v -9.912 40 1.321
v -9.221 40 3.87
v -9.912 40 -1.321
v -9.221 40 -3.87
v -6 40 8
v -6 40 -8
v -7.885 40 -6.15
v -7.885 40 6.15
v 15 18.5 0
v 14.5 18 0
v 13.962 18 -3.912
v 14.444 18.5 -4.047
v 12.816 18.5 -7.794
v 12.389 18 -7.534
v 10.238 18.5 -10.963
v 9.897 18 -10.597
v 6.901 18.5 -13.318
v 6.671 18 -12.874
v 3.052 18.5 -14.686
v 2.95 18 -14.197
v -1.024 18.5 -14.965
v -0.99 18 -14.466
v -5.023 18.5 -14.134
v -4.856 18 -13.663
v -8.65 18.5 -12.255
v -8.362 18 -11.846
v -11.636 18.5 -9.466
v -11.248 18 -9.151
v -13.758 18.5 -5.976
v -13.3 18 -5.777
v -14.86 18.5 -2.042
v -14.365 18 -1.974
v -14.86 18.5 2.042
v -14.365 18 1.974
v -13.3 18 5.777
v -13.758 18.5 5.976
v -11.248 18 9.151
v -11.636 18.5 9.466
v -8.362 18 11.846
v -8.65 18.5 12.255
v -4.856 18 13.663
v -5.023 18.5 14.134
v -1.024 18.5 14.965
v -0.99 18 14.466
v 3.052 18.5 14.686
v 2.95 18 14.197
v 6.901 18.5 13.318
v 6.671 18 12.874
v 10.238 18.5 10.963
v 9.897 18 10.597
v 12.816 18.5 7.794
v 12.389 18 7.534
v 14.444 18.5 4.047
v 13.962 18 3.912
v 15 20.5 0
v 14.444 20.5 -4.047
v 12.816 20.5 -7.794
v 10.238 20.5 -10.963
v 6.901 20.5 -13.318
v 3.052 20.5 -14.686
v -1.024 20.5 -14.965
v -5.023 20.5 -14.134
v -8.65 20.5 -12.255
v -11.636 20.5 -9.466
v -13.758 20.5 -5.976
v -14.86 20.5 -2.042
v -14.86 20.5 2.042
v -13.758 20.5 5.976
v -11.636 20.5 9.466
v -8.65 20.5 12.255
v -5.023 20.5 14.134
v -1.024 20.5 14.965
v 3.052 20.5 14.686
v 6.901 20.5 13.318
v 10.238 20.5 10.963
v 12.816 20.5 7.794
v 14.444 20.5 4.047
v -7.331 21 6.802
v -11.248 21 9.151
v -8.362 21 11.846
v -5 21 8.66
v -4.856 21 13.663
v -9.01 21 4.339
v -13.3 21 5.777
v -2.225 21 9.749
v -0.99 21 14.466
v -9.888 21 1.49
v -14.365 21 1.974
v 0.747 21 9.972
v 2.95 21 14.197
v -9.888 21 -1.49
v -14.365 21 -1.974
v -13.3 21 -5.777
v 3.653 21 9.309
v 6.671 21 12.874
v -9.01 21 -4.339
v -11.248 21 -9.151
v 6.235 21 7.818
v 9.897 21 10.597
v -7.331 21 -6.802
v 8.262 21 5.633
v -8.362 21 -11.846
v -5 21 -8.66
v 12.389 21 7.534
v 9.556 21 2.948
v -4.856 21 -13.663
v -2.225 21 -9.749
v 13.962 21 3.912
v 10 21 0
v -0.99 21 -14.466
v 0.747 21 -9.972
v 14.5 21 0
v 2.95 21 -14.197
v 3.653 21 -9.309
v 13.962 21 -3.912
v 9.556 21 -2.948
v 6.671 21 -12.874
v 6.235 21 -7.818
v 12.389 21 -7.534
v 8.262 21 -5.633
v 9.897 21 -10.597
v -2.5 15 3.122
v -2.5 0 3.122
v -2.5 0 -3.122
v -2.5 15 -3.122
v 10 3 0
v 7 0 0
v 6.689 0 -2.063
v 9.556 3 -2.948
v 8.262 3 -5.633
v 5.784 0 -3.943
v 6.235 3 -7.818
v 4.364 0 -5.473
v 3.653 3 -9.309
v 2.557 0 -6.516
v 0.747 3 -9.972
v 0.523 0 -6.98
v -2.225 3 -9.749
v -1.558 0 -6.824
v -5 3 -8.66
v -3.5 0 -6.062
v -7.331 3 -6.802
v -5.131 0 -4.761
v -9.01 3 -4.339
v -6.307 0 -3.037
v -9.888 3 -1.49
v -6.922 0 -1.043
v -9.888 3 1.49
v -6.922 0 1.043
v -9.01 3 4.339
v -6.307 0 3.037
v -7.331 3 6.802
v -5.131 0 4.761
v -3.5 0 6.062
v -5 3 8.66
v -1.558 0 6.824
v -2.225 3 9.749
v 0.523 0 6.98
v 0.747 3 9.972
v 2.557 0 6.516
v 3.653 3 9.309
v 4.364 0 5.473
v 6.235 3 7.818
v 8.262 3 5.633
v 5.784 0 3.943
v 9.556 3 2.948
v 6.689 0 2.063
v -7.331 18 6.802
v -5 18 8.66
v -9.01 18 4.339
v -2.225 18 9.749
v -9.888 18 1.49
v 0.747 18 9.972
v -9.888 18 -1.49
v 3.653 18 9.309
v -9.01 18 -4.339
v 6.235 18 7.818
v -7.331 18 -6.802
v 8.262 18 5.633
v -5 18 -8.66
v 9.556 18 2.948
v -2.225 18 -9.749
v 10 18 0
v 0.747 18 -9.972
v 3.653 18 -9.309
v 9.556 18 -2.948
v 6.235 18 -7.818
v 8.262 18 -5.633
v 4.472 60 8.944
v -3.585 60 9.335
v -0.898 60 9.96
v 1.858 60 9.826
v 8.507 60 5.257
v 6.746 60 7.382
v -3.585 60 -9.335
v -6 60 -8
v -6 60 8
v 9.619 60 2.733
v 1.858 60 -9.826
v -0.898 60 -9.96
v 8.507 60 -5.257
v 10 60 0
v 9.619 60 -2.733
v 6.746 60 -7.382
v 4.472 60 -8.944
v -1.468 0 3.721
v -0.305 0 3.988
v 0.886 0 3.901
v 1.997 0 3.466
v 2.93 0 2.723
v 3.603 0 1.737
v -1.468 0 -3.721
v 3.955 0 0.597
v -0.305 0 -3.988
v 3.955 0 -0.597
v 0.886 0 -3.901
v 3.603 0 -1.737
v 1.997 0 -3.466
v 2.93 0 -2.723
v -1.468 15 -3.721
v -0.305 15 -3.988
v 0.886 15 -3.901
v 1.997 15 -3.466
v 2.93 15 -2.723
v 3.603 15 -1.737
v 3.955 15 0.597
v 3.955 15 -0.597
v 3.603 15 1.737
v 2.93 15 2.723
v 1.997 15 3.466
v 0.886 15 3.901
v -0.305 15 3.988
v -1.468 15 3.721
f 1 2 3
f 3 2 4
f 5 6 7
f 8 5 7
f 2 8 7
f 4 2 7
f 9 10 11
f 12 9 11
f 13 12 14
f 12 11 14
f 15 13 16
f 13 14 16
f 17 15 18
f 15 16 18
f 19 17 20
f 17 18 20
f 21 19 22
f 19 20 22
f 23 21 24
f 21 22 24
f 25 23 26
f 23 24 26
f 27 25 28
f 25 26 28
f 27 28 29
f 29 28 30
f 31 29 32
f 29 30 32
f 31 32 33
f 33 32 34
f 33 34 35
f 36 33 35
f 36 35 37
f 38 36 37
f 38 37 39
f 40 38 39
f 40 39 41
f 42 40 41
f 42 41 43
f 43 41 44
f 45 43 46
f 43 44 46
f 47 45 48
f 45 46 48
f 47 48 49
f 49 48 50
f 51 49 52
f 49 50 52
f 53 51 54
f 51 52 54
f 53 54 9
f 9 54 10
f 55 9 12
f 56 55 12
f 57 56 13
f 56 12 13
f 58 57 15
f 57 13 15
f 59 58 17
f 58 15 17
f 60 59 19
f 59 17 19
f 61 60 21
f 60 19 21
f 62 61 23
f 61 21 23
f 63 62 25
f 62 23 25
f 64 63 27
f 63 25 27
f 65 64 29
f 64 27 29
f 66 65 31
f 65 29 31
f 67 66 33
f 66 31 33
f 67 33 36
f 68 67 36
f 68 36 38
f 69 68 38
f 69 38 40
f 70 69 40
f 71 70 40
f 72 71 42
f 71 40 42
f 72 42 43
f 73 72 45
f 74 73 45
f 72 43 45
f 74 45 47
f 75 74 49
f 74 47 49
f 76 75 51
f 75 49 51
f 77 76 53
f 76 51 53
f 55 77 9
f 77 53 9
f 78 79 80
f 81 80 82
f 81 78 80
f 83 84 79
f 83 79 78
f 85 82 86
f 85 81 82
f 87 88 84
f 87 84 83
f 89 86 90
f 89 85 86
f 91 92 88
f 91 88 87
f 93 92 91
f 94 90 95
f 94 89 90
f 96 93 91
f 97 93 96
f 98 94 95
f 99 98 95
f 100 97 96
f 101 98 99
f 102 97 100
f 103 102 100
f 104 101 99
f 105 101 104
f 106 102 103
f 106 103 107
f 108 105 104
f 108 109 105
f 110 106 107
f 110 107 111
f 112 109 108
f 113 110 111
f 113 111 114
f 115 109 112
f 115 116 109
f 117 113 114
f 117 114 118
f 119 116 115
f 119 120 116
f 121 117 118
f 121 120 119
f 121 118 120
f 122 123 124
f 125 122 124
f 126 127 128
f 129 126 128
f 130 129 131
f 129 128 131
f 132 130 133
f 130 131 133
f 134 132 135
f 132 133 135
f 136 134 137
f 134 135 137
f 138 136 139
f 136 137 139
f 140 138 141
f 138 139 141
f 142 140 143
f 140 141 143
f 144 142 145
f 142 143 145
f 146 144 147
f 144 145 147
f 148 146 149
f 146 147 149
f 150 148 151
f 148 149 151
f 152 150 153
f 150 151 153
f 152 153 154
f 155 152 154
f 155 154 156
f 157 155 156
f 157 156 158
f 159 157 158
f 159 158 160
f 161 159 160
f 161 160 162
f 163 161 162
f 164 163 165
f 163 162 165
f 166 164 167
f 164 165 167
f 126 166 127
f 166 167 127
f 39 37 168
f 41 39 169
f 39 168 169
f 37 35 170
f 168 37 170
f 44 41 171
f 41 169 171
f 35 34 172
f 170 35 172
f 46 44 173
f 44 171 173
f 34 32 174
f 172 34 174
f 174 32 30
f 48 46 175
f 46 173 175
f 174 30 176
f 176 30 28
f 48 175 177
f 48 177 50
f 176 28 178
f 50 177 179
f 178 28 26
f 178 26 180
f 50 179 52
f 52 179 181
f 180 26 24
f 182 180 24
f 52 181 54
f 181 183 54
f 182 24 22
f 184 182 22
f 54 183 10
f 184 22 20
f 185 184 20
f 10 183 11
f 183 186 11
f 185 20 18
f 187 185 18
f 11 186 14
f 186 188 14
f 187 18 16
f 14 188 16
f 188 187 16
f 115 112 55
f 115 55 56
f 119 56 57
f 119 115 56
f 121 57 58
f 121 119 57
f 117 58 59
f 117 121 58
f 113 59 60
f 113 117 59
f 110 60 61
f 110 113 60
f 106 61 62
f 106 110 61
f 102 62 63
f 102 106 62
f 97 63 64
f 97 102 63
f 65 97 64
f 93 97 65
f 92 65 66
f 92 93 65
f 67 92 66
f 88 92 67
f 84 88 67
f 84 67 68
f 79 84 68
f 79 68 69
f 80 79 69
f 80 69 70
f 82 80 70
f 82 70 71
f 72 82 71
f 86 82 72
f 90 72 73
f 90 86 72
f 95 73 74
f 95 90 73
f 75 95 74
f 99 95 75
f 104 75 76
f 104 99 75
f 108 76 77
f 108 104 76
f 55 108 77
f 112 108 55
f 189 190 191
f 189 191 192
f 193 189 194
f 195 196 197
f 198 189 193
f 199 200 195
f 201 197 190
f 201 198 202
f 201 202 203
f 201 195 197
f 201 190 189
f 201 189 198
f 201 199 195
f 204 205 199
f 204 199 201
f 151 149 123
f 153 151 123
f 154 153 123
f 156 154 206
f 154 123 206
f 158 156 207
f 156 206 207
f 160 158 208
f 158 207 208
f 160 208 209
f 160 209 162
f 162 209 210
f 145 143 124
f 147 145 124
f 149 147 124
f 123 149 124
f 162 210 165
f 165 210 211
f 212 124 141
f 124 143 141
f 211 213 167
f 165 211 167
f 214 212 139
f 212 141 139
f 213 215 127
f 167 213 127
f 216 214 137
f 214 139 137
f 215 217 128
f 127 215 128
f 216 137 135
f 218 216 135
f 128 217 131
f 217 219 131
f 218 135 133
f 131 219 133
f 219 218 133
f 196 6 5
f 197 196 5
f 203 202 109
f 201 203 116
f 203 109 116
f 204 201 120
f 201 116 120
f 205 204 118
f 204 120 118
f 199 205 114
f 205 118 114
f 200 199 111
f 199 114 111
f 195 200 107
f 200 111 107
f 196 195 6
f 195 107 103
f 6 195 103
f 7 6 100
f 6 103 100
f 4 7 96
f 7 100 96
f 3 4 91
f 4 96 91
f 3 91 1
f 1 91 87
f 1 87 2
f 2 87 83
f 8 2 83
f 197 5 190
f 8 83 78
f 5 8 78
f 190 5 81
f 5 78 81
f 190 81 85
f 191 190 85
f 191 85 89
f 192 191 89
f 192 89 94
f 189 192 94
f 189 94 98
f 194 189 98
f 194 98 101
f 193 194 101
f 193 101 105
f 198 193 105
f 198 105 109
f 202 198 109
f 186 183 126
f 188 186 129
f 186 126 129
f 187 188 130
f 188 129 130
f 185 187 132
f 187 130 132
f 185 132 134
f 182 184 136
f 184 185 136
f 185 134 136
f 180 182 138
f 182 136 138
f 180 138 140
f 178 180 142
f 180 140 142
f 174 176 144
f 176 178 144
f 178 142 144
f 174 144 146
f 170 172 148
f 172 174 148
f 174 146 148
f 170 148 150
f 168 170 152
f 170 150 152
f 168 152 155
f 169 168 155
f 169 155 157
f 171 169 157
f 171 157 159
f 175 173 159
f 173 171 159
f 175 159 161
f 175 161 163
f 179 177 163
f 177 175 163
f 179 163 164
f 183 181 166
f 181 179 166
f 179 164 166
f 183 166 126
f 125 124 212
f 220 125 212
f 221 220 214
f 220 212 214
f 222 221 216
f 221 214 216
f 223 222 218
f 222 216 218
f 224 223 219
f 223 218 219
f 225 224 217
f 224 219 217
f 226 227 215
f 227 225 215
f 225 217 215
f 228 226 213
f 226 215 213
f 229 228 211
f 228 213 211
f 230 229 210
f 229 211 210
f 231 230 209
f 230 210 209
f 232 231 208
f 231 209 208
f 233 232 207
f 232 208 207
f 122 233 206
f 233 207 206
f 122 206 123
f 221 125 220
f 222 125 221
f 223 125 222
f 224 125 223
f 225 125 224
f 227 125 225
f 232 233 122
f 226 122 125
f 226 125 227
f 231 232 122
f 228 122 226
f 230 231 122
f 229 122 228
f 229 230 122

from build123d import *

# Parameters (mm, degrees)
SKETCH1_R           = 10
BOSS_EXTRUDE1_DEPTH = 60
SKETCH2_R           = 4
CUT_EXTRUDE1_DEPTH  = 15
BOSS_EXTRUDE2_REACH = 62
CUT_EXTRUDE2_DEPTH  = 20
CHAMFER3_SIZE       = 3
BOSS_EXTRUDE3_START = 18
SKETCH5_R           = 15
BOSS_EXTRUDE3_DEPTH = 3
CHAMFER4_SIZE       = 0.5


with BuildPart() as part:
    # Sketch1 → Boss-Extrude1 (new body)
    with BuildSketch(Plane(origin=(0, 0, 0), x_dir=(1, 0, 0), z_dir=(0, 1, 0))):
        Circle(SKETCH1_R)
    extrude(amount=BOSS_EXTRUDE1_DEPTH)

    # Sketch2 → Cut-Extrude1 (cut)
    with BuildSketch(Plane.XZ):
        Circle(SKETCH2_R)
    extrude(amount=-CUT_EXTRUDE1_DEPTH, mode=Mode.SUBTRACT)

    # Sketch3 → Boss-Extrude2 (add, up to next)
    with BuildSketch(Plane.XZ, mode=Mode.PRIVATE) as boss_extrude2_sk1:
        with BuildLine():
            Line((-2.5, 3.122498999), (-2.5, -3.122498999))
            ThreePointArc((-2.5, -3.122498999), (-4, 0), (-2.5, 3.122498999))
        make_face()
    boss_extrude2_tool1 = extrude(boss_extrude2_sk1.sketch, amount=-BOSS_EXTRUDE2_REACH, mode=Mode.PRIVATE) - part.part
    add(boss_extrude2_tool1.solids().sort_by_distance((-3.110827, 0, 0))[0])

    # Sketch4 → Cut-Extrude2 (cut)
    with BuildSketch(Plane(origin=(0, 60, 0), x_dir=(1, 0, 0), z_dir=(0, 1, 0))):
        with BuildLine():
            Line((-6, 8), (-6, -8))
            ThreePointArc((-6, -8), (-10, 0), (-6, 8))
        make_face()
    extrude(amount=-CUT_EXTRUDE2_DEPTH, mode=Mode.SUBTRACT)

    # Chamfer3
    chamfer3_edges = [part.edges().sort_by_distance(p)[0] for p in [
        (-10, 0, 0),
    ]]
    chamfer(chamfer3_edges, length=CHAMFER3_SIZE)

    # Sketch5 → Boss-Extrude3 (add)
    with BuildSketch(Plane(origin=(0, 0, 0), x_dir=(1, 0, 0), z_dir=(0, 1, 0)).offset(BOSS_EXTRUDE3_START)):
        Circle(SKETCH5_R)
    extrude(amount=BOSS_EXTRUDE3_DEPTH)

    # Chamfer4
    chamfer4_edges = [part.edges().sort_by_distance(p)[0] for p in [
        (-15, 18, 0),
        (-15, 21, 0),
    ]]
    chamfer(chamfer4_edges, length=CHAMFER4_SIZE)


solid = part.part
